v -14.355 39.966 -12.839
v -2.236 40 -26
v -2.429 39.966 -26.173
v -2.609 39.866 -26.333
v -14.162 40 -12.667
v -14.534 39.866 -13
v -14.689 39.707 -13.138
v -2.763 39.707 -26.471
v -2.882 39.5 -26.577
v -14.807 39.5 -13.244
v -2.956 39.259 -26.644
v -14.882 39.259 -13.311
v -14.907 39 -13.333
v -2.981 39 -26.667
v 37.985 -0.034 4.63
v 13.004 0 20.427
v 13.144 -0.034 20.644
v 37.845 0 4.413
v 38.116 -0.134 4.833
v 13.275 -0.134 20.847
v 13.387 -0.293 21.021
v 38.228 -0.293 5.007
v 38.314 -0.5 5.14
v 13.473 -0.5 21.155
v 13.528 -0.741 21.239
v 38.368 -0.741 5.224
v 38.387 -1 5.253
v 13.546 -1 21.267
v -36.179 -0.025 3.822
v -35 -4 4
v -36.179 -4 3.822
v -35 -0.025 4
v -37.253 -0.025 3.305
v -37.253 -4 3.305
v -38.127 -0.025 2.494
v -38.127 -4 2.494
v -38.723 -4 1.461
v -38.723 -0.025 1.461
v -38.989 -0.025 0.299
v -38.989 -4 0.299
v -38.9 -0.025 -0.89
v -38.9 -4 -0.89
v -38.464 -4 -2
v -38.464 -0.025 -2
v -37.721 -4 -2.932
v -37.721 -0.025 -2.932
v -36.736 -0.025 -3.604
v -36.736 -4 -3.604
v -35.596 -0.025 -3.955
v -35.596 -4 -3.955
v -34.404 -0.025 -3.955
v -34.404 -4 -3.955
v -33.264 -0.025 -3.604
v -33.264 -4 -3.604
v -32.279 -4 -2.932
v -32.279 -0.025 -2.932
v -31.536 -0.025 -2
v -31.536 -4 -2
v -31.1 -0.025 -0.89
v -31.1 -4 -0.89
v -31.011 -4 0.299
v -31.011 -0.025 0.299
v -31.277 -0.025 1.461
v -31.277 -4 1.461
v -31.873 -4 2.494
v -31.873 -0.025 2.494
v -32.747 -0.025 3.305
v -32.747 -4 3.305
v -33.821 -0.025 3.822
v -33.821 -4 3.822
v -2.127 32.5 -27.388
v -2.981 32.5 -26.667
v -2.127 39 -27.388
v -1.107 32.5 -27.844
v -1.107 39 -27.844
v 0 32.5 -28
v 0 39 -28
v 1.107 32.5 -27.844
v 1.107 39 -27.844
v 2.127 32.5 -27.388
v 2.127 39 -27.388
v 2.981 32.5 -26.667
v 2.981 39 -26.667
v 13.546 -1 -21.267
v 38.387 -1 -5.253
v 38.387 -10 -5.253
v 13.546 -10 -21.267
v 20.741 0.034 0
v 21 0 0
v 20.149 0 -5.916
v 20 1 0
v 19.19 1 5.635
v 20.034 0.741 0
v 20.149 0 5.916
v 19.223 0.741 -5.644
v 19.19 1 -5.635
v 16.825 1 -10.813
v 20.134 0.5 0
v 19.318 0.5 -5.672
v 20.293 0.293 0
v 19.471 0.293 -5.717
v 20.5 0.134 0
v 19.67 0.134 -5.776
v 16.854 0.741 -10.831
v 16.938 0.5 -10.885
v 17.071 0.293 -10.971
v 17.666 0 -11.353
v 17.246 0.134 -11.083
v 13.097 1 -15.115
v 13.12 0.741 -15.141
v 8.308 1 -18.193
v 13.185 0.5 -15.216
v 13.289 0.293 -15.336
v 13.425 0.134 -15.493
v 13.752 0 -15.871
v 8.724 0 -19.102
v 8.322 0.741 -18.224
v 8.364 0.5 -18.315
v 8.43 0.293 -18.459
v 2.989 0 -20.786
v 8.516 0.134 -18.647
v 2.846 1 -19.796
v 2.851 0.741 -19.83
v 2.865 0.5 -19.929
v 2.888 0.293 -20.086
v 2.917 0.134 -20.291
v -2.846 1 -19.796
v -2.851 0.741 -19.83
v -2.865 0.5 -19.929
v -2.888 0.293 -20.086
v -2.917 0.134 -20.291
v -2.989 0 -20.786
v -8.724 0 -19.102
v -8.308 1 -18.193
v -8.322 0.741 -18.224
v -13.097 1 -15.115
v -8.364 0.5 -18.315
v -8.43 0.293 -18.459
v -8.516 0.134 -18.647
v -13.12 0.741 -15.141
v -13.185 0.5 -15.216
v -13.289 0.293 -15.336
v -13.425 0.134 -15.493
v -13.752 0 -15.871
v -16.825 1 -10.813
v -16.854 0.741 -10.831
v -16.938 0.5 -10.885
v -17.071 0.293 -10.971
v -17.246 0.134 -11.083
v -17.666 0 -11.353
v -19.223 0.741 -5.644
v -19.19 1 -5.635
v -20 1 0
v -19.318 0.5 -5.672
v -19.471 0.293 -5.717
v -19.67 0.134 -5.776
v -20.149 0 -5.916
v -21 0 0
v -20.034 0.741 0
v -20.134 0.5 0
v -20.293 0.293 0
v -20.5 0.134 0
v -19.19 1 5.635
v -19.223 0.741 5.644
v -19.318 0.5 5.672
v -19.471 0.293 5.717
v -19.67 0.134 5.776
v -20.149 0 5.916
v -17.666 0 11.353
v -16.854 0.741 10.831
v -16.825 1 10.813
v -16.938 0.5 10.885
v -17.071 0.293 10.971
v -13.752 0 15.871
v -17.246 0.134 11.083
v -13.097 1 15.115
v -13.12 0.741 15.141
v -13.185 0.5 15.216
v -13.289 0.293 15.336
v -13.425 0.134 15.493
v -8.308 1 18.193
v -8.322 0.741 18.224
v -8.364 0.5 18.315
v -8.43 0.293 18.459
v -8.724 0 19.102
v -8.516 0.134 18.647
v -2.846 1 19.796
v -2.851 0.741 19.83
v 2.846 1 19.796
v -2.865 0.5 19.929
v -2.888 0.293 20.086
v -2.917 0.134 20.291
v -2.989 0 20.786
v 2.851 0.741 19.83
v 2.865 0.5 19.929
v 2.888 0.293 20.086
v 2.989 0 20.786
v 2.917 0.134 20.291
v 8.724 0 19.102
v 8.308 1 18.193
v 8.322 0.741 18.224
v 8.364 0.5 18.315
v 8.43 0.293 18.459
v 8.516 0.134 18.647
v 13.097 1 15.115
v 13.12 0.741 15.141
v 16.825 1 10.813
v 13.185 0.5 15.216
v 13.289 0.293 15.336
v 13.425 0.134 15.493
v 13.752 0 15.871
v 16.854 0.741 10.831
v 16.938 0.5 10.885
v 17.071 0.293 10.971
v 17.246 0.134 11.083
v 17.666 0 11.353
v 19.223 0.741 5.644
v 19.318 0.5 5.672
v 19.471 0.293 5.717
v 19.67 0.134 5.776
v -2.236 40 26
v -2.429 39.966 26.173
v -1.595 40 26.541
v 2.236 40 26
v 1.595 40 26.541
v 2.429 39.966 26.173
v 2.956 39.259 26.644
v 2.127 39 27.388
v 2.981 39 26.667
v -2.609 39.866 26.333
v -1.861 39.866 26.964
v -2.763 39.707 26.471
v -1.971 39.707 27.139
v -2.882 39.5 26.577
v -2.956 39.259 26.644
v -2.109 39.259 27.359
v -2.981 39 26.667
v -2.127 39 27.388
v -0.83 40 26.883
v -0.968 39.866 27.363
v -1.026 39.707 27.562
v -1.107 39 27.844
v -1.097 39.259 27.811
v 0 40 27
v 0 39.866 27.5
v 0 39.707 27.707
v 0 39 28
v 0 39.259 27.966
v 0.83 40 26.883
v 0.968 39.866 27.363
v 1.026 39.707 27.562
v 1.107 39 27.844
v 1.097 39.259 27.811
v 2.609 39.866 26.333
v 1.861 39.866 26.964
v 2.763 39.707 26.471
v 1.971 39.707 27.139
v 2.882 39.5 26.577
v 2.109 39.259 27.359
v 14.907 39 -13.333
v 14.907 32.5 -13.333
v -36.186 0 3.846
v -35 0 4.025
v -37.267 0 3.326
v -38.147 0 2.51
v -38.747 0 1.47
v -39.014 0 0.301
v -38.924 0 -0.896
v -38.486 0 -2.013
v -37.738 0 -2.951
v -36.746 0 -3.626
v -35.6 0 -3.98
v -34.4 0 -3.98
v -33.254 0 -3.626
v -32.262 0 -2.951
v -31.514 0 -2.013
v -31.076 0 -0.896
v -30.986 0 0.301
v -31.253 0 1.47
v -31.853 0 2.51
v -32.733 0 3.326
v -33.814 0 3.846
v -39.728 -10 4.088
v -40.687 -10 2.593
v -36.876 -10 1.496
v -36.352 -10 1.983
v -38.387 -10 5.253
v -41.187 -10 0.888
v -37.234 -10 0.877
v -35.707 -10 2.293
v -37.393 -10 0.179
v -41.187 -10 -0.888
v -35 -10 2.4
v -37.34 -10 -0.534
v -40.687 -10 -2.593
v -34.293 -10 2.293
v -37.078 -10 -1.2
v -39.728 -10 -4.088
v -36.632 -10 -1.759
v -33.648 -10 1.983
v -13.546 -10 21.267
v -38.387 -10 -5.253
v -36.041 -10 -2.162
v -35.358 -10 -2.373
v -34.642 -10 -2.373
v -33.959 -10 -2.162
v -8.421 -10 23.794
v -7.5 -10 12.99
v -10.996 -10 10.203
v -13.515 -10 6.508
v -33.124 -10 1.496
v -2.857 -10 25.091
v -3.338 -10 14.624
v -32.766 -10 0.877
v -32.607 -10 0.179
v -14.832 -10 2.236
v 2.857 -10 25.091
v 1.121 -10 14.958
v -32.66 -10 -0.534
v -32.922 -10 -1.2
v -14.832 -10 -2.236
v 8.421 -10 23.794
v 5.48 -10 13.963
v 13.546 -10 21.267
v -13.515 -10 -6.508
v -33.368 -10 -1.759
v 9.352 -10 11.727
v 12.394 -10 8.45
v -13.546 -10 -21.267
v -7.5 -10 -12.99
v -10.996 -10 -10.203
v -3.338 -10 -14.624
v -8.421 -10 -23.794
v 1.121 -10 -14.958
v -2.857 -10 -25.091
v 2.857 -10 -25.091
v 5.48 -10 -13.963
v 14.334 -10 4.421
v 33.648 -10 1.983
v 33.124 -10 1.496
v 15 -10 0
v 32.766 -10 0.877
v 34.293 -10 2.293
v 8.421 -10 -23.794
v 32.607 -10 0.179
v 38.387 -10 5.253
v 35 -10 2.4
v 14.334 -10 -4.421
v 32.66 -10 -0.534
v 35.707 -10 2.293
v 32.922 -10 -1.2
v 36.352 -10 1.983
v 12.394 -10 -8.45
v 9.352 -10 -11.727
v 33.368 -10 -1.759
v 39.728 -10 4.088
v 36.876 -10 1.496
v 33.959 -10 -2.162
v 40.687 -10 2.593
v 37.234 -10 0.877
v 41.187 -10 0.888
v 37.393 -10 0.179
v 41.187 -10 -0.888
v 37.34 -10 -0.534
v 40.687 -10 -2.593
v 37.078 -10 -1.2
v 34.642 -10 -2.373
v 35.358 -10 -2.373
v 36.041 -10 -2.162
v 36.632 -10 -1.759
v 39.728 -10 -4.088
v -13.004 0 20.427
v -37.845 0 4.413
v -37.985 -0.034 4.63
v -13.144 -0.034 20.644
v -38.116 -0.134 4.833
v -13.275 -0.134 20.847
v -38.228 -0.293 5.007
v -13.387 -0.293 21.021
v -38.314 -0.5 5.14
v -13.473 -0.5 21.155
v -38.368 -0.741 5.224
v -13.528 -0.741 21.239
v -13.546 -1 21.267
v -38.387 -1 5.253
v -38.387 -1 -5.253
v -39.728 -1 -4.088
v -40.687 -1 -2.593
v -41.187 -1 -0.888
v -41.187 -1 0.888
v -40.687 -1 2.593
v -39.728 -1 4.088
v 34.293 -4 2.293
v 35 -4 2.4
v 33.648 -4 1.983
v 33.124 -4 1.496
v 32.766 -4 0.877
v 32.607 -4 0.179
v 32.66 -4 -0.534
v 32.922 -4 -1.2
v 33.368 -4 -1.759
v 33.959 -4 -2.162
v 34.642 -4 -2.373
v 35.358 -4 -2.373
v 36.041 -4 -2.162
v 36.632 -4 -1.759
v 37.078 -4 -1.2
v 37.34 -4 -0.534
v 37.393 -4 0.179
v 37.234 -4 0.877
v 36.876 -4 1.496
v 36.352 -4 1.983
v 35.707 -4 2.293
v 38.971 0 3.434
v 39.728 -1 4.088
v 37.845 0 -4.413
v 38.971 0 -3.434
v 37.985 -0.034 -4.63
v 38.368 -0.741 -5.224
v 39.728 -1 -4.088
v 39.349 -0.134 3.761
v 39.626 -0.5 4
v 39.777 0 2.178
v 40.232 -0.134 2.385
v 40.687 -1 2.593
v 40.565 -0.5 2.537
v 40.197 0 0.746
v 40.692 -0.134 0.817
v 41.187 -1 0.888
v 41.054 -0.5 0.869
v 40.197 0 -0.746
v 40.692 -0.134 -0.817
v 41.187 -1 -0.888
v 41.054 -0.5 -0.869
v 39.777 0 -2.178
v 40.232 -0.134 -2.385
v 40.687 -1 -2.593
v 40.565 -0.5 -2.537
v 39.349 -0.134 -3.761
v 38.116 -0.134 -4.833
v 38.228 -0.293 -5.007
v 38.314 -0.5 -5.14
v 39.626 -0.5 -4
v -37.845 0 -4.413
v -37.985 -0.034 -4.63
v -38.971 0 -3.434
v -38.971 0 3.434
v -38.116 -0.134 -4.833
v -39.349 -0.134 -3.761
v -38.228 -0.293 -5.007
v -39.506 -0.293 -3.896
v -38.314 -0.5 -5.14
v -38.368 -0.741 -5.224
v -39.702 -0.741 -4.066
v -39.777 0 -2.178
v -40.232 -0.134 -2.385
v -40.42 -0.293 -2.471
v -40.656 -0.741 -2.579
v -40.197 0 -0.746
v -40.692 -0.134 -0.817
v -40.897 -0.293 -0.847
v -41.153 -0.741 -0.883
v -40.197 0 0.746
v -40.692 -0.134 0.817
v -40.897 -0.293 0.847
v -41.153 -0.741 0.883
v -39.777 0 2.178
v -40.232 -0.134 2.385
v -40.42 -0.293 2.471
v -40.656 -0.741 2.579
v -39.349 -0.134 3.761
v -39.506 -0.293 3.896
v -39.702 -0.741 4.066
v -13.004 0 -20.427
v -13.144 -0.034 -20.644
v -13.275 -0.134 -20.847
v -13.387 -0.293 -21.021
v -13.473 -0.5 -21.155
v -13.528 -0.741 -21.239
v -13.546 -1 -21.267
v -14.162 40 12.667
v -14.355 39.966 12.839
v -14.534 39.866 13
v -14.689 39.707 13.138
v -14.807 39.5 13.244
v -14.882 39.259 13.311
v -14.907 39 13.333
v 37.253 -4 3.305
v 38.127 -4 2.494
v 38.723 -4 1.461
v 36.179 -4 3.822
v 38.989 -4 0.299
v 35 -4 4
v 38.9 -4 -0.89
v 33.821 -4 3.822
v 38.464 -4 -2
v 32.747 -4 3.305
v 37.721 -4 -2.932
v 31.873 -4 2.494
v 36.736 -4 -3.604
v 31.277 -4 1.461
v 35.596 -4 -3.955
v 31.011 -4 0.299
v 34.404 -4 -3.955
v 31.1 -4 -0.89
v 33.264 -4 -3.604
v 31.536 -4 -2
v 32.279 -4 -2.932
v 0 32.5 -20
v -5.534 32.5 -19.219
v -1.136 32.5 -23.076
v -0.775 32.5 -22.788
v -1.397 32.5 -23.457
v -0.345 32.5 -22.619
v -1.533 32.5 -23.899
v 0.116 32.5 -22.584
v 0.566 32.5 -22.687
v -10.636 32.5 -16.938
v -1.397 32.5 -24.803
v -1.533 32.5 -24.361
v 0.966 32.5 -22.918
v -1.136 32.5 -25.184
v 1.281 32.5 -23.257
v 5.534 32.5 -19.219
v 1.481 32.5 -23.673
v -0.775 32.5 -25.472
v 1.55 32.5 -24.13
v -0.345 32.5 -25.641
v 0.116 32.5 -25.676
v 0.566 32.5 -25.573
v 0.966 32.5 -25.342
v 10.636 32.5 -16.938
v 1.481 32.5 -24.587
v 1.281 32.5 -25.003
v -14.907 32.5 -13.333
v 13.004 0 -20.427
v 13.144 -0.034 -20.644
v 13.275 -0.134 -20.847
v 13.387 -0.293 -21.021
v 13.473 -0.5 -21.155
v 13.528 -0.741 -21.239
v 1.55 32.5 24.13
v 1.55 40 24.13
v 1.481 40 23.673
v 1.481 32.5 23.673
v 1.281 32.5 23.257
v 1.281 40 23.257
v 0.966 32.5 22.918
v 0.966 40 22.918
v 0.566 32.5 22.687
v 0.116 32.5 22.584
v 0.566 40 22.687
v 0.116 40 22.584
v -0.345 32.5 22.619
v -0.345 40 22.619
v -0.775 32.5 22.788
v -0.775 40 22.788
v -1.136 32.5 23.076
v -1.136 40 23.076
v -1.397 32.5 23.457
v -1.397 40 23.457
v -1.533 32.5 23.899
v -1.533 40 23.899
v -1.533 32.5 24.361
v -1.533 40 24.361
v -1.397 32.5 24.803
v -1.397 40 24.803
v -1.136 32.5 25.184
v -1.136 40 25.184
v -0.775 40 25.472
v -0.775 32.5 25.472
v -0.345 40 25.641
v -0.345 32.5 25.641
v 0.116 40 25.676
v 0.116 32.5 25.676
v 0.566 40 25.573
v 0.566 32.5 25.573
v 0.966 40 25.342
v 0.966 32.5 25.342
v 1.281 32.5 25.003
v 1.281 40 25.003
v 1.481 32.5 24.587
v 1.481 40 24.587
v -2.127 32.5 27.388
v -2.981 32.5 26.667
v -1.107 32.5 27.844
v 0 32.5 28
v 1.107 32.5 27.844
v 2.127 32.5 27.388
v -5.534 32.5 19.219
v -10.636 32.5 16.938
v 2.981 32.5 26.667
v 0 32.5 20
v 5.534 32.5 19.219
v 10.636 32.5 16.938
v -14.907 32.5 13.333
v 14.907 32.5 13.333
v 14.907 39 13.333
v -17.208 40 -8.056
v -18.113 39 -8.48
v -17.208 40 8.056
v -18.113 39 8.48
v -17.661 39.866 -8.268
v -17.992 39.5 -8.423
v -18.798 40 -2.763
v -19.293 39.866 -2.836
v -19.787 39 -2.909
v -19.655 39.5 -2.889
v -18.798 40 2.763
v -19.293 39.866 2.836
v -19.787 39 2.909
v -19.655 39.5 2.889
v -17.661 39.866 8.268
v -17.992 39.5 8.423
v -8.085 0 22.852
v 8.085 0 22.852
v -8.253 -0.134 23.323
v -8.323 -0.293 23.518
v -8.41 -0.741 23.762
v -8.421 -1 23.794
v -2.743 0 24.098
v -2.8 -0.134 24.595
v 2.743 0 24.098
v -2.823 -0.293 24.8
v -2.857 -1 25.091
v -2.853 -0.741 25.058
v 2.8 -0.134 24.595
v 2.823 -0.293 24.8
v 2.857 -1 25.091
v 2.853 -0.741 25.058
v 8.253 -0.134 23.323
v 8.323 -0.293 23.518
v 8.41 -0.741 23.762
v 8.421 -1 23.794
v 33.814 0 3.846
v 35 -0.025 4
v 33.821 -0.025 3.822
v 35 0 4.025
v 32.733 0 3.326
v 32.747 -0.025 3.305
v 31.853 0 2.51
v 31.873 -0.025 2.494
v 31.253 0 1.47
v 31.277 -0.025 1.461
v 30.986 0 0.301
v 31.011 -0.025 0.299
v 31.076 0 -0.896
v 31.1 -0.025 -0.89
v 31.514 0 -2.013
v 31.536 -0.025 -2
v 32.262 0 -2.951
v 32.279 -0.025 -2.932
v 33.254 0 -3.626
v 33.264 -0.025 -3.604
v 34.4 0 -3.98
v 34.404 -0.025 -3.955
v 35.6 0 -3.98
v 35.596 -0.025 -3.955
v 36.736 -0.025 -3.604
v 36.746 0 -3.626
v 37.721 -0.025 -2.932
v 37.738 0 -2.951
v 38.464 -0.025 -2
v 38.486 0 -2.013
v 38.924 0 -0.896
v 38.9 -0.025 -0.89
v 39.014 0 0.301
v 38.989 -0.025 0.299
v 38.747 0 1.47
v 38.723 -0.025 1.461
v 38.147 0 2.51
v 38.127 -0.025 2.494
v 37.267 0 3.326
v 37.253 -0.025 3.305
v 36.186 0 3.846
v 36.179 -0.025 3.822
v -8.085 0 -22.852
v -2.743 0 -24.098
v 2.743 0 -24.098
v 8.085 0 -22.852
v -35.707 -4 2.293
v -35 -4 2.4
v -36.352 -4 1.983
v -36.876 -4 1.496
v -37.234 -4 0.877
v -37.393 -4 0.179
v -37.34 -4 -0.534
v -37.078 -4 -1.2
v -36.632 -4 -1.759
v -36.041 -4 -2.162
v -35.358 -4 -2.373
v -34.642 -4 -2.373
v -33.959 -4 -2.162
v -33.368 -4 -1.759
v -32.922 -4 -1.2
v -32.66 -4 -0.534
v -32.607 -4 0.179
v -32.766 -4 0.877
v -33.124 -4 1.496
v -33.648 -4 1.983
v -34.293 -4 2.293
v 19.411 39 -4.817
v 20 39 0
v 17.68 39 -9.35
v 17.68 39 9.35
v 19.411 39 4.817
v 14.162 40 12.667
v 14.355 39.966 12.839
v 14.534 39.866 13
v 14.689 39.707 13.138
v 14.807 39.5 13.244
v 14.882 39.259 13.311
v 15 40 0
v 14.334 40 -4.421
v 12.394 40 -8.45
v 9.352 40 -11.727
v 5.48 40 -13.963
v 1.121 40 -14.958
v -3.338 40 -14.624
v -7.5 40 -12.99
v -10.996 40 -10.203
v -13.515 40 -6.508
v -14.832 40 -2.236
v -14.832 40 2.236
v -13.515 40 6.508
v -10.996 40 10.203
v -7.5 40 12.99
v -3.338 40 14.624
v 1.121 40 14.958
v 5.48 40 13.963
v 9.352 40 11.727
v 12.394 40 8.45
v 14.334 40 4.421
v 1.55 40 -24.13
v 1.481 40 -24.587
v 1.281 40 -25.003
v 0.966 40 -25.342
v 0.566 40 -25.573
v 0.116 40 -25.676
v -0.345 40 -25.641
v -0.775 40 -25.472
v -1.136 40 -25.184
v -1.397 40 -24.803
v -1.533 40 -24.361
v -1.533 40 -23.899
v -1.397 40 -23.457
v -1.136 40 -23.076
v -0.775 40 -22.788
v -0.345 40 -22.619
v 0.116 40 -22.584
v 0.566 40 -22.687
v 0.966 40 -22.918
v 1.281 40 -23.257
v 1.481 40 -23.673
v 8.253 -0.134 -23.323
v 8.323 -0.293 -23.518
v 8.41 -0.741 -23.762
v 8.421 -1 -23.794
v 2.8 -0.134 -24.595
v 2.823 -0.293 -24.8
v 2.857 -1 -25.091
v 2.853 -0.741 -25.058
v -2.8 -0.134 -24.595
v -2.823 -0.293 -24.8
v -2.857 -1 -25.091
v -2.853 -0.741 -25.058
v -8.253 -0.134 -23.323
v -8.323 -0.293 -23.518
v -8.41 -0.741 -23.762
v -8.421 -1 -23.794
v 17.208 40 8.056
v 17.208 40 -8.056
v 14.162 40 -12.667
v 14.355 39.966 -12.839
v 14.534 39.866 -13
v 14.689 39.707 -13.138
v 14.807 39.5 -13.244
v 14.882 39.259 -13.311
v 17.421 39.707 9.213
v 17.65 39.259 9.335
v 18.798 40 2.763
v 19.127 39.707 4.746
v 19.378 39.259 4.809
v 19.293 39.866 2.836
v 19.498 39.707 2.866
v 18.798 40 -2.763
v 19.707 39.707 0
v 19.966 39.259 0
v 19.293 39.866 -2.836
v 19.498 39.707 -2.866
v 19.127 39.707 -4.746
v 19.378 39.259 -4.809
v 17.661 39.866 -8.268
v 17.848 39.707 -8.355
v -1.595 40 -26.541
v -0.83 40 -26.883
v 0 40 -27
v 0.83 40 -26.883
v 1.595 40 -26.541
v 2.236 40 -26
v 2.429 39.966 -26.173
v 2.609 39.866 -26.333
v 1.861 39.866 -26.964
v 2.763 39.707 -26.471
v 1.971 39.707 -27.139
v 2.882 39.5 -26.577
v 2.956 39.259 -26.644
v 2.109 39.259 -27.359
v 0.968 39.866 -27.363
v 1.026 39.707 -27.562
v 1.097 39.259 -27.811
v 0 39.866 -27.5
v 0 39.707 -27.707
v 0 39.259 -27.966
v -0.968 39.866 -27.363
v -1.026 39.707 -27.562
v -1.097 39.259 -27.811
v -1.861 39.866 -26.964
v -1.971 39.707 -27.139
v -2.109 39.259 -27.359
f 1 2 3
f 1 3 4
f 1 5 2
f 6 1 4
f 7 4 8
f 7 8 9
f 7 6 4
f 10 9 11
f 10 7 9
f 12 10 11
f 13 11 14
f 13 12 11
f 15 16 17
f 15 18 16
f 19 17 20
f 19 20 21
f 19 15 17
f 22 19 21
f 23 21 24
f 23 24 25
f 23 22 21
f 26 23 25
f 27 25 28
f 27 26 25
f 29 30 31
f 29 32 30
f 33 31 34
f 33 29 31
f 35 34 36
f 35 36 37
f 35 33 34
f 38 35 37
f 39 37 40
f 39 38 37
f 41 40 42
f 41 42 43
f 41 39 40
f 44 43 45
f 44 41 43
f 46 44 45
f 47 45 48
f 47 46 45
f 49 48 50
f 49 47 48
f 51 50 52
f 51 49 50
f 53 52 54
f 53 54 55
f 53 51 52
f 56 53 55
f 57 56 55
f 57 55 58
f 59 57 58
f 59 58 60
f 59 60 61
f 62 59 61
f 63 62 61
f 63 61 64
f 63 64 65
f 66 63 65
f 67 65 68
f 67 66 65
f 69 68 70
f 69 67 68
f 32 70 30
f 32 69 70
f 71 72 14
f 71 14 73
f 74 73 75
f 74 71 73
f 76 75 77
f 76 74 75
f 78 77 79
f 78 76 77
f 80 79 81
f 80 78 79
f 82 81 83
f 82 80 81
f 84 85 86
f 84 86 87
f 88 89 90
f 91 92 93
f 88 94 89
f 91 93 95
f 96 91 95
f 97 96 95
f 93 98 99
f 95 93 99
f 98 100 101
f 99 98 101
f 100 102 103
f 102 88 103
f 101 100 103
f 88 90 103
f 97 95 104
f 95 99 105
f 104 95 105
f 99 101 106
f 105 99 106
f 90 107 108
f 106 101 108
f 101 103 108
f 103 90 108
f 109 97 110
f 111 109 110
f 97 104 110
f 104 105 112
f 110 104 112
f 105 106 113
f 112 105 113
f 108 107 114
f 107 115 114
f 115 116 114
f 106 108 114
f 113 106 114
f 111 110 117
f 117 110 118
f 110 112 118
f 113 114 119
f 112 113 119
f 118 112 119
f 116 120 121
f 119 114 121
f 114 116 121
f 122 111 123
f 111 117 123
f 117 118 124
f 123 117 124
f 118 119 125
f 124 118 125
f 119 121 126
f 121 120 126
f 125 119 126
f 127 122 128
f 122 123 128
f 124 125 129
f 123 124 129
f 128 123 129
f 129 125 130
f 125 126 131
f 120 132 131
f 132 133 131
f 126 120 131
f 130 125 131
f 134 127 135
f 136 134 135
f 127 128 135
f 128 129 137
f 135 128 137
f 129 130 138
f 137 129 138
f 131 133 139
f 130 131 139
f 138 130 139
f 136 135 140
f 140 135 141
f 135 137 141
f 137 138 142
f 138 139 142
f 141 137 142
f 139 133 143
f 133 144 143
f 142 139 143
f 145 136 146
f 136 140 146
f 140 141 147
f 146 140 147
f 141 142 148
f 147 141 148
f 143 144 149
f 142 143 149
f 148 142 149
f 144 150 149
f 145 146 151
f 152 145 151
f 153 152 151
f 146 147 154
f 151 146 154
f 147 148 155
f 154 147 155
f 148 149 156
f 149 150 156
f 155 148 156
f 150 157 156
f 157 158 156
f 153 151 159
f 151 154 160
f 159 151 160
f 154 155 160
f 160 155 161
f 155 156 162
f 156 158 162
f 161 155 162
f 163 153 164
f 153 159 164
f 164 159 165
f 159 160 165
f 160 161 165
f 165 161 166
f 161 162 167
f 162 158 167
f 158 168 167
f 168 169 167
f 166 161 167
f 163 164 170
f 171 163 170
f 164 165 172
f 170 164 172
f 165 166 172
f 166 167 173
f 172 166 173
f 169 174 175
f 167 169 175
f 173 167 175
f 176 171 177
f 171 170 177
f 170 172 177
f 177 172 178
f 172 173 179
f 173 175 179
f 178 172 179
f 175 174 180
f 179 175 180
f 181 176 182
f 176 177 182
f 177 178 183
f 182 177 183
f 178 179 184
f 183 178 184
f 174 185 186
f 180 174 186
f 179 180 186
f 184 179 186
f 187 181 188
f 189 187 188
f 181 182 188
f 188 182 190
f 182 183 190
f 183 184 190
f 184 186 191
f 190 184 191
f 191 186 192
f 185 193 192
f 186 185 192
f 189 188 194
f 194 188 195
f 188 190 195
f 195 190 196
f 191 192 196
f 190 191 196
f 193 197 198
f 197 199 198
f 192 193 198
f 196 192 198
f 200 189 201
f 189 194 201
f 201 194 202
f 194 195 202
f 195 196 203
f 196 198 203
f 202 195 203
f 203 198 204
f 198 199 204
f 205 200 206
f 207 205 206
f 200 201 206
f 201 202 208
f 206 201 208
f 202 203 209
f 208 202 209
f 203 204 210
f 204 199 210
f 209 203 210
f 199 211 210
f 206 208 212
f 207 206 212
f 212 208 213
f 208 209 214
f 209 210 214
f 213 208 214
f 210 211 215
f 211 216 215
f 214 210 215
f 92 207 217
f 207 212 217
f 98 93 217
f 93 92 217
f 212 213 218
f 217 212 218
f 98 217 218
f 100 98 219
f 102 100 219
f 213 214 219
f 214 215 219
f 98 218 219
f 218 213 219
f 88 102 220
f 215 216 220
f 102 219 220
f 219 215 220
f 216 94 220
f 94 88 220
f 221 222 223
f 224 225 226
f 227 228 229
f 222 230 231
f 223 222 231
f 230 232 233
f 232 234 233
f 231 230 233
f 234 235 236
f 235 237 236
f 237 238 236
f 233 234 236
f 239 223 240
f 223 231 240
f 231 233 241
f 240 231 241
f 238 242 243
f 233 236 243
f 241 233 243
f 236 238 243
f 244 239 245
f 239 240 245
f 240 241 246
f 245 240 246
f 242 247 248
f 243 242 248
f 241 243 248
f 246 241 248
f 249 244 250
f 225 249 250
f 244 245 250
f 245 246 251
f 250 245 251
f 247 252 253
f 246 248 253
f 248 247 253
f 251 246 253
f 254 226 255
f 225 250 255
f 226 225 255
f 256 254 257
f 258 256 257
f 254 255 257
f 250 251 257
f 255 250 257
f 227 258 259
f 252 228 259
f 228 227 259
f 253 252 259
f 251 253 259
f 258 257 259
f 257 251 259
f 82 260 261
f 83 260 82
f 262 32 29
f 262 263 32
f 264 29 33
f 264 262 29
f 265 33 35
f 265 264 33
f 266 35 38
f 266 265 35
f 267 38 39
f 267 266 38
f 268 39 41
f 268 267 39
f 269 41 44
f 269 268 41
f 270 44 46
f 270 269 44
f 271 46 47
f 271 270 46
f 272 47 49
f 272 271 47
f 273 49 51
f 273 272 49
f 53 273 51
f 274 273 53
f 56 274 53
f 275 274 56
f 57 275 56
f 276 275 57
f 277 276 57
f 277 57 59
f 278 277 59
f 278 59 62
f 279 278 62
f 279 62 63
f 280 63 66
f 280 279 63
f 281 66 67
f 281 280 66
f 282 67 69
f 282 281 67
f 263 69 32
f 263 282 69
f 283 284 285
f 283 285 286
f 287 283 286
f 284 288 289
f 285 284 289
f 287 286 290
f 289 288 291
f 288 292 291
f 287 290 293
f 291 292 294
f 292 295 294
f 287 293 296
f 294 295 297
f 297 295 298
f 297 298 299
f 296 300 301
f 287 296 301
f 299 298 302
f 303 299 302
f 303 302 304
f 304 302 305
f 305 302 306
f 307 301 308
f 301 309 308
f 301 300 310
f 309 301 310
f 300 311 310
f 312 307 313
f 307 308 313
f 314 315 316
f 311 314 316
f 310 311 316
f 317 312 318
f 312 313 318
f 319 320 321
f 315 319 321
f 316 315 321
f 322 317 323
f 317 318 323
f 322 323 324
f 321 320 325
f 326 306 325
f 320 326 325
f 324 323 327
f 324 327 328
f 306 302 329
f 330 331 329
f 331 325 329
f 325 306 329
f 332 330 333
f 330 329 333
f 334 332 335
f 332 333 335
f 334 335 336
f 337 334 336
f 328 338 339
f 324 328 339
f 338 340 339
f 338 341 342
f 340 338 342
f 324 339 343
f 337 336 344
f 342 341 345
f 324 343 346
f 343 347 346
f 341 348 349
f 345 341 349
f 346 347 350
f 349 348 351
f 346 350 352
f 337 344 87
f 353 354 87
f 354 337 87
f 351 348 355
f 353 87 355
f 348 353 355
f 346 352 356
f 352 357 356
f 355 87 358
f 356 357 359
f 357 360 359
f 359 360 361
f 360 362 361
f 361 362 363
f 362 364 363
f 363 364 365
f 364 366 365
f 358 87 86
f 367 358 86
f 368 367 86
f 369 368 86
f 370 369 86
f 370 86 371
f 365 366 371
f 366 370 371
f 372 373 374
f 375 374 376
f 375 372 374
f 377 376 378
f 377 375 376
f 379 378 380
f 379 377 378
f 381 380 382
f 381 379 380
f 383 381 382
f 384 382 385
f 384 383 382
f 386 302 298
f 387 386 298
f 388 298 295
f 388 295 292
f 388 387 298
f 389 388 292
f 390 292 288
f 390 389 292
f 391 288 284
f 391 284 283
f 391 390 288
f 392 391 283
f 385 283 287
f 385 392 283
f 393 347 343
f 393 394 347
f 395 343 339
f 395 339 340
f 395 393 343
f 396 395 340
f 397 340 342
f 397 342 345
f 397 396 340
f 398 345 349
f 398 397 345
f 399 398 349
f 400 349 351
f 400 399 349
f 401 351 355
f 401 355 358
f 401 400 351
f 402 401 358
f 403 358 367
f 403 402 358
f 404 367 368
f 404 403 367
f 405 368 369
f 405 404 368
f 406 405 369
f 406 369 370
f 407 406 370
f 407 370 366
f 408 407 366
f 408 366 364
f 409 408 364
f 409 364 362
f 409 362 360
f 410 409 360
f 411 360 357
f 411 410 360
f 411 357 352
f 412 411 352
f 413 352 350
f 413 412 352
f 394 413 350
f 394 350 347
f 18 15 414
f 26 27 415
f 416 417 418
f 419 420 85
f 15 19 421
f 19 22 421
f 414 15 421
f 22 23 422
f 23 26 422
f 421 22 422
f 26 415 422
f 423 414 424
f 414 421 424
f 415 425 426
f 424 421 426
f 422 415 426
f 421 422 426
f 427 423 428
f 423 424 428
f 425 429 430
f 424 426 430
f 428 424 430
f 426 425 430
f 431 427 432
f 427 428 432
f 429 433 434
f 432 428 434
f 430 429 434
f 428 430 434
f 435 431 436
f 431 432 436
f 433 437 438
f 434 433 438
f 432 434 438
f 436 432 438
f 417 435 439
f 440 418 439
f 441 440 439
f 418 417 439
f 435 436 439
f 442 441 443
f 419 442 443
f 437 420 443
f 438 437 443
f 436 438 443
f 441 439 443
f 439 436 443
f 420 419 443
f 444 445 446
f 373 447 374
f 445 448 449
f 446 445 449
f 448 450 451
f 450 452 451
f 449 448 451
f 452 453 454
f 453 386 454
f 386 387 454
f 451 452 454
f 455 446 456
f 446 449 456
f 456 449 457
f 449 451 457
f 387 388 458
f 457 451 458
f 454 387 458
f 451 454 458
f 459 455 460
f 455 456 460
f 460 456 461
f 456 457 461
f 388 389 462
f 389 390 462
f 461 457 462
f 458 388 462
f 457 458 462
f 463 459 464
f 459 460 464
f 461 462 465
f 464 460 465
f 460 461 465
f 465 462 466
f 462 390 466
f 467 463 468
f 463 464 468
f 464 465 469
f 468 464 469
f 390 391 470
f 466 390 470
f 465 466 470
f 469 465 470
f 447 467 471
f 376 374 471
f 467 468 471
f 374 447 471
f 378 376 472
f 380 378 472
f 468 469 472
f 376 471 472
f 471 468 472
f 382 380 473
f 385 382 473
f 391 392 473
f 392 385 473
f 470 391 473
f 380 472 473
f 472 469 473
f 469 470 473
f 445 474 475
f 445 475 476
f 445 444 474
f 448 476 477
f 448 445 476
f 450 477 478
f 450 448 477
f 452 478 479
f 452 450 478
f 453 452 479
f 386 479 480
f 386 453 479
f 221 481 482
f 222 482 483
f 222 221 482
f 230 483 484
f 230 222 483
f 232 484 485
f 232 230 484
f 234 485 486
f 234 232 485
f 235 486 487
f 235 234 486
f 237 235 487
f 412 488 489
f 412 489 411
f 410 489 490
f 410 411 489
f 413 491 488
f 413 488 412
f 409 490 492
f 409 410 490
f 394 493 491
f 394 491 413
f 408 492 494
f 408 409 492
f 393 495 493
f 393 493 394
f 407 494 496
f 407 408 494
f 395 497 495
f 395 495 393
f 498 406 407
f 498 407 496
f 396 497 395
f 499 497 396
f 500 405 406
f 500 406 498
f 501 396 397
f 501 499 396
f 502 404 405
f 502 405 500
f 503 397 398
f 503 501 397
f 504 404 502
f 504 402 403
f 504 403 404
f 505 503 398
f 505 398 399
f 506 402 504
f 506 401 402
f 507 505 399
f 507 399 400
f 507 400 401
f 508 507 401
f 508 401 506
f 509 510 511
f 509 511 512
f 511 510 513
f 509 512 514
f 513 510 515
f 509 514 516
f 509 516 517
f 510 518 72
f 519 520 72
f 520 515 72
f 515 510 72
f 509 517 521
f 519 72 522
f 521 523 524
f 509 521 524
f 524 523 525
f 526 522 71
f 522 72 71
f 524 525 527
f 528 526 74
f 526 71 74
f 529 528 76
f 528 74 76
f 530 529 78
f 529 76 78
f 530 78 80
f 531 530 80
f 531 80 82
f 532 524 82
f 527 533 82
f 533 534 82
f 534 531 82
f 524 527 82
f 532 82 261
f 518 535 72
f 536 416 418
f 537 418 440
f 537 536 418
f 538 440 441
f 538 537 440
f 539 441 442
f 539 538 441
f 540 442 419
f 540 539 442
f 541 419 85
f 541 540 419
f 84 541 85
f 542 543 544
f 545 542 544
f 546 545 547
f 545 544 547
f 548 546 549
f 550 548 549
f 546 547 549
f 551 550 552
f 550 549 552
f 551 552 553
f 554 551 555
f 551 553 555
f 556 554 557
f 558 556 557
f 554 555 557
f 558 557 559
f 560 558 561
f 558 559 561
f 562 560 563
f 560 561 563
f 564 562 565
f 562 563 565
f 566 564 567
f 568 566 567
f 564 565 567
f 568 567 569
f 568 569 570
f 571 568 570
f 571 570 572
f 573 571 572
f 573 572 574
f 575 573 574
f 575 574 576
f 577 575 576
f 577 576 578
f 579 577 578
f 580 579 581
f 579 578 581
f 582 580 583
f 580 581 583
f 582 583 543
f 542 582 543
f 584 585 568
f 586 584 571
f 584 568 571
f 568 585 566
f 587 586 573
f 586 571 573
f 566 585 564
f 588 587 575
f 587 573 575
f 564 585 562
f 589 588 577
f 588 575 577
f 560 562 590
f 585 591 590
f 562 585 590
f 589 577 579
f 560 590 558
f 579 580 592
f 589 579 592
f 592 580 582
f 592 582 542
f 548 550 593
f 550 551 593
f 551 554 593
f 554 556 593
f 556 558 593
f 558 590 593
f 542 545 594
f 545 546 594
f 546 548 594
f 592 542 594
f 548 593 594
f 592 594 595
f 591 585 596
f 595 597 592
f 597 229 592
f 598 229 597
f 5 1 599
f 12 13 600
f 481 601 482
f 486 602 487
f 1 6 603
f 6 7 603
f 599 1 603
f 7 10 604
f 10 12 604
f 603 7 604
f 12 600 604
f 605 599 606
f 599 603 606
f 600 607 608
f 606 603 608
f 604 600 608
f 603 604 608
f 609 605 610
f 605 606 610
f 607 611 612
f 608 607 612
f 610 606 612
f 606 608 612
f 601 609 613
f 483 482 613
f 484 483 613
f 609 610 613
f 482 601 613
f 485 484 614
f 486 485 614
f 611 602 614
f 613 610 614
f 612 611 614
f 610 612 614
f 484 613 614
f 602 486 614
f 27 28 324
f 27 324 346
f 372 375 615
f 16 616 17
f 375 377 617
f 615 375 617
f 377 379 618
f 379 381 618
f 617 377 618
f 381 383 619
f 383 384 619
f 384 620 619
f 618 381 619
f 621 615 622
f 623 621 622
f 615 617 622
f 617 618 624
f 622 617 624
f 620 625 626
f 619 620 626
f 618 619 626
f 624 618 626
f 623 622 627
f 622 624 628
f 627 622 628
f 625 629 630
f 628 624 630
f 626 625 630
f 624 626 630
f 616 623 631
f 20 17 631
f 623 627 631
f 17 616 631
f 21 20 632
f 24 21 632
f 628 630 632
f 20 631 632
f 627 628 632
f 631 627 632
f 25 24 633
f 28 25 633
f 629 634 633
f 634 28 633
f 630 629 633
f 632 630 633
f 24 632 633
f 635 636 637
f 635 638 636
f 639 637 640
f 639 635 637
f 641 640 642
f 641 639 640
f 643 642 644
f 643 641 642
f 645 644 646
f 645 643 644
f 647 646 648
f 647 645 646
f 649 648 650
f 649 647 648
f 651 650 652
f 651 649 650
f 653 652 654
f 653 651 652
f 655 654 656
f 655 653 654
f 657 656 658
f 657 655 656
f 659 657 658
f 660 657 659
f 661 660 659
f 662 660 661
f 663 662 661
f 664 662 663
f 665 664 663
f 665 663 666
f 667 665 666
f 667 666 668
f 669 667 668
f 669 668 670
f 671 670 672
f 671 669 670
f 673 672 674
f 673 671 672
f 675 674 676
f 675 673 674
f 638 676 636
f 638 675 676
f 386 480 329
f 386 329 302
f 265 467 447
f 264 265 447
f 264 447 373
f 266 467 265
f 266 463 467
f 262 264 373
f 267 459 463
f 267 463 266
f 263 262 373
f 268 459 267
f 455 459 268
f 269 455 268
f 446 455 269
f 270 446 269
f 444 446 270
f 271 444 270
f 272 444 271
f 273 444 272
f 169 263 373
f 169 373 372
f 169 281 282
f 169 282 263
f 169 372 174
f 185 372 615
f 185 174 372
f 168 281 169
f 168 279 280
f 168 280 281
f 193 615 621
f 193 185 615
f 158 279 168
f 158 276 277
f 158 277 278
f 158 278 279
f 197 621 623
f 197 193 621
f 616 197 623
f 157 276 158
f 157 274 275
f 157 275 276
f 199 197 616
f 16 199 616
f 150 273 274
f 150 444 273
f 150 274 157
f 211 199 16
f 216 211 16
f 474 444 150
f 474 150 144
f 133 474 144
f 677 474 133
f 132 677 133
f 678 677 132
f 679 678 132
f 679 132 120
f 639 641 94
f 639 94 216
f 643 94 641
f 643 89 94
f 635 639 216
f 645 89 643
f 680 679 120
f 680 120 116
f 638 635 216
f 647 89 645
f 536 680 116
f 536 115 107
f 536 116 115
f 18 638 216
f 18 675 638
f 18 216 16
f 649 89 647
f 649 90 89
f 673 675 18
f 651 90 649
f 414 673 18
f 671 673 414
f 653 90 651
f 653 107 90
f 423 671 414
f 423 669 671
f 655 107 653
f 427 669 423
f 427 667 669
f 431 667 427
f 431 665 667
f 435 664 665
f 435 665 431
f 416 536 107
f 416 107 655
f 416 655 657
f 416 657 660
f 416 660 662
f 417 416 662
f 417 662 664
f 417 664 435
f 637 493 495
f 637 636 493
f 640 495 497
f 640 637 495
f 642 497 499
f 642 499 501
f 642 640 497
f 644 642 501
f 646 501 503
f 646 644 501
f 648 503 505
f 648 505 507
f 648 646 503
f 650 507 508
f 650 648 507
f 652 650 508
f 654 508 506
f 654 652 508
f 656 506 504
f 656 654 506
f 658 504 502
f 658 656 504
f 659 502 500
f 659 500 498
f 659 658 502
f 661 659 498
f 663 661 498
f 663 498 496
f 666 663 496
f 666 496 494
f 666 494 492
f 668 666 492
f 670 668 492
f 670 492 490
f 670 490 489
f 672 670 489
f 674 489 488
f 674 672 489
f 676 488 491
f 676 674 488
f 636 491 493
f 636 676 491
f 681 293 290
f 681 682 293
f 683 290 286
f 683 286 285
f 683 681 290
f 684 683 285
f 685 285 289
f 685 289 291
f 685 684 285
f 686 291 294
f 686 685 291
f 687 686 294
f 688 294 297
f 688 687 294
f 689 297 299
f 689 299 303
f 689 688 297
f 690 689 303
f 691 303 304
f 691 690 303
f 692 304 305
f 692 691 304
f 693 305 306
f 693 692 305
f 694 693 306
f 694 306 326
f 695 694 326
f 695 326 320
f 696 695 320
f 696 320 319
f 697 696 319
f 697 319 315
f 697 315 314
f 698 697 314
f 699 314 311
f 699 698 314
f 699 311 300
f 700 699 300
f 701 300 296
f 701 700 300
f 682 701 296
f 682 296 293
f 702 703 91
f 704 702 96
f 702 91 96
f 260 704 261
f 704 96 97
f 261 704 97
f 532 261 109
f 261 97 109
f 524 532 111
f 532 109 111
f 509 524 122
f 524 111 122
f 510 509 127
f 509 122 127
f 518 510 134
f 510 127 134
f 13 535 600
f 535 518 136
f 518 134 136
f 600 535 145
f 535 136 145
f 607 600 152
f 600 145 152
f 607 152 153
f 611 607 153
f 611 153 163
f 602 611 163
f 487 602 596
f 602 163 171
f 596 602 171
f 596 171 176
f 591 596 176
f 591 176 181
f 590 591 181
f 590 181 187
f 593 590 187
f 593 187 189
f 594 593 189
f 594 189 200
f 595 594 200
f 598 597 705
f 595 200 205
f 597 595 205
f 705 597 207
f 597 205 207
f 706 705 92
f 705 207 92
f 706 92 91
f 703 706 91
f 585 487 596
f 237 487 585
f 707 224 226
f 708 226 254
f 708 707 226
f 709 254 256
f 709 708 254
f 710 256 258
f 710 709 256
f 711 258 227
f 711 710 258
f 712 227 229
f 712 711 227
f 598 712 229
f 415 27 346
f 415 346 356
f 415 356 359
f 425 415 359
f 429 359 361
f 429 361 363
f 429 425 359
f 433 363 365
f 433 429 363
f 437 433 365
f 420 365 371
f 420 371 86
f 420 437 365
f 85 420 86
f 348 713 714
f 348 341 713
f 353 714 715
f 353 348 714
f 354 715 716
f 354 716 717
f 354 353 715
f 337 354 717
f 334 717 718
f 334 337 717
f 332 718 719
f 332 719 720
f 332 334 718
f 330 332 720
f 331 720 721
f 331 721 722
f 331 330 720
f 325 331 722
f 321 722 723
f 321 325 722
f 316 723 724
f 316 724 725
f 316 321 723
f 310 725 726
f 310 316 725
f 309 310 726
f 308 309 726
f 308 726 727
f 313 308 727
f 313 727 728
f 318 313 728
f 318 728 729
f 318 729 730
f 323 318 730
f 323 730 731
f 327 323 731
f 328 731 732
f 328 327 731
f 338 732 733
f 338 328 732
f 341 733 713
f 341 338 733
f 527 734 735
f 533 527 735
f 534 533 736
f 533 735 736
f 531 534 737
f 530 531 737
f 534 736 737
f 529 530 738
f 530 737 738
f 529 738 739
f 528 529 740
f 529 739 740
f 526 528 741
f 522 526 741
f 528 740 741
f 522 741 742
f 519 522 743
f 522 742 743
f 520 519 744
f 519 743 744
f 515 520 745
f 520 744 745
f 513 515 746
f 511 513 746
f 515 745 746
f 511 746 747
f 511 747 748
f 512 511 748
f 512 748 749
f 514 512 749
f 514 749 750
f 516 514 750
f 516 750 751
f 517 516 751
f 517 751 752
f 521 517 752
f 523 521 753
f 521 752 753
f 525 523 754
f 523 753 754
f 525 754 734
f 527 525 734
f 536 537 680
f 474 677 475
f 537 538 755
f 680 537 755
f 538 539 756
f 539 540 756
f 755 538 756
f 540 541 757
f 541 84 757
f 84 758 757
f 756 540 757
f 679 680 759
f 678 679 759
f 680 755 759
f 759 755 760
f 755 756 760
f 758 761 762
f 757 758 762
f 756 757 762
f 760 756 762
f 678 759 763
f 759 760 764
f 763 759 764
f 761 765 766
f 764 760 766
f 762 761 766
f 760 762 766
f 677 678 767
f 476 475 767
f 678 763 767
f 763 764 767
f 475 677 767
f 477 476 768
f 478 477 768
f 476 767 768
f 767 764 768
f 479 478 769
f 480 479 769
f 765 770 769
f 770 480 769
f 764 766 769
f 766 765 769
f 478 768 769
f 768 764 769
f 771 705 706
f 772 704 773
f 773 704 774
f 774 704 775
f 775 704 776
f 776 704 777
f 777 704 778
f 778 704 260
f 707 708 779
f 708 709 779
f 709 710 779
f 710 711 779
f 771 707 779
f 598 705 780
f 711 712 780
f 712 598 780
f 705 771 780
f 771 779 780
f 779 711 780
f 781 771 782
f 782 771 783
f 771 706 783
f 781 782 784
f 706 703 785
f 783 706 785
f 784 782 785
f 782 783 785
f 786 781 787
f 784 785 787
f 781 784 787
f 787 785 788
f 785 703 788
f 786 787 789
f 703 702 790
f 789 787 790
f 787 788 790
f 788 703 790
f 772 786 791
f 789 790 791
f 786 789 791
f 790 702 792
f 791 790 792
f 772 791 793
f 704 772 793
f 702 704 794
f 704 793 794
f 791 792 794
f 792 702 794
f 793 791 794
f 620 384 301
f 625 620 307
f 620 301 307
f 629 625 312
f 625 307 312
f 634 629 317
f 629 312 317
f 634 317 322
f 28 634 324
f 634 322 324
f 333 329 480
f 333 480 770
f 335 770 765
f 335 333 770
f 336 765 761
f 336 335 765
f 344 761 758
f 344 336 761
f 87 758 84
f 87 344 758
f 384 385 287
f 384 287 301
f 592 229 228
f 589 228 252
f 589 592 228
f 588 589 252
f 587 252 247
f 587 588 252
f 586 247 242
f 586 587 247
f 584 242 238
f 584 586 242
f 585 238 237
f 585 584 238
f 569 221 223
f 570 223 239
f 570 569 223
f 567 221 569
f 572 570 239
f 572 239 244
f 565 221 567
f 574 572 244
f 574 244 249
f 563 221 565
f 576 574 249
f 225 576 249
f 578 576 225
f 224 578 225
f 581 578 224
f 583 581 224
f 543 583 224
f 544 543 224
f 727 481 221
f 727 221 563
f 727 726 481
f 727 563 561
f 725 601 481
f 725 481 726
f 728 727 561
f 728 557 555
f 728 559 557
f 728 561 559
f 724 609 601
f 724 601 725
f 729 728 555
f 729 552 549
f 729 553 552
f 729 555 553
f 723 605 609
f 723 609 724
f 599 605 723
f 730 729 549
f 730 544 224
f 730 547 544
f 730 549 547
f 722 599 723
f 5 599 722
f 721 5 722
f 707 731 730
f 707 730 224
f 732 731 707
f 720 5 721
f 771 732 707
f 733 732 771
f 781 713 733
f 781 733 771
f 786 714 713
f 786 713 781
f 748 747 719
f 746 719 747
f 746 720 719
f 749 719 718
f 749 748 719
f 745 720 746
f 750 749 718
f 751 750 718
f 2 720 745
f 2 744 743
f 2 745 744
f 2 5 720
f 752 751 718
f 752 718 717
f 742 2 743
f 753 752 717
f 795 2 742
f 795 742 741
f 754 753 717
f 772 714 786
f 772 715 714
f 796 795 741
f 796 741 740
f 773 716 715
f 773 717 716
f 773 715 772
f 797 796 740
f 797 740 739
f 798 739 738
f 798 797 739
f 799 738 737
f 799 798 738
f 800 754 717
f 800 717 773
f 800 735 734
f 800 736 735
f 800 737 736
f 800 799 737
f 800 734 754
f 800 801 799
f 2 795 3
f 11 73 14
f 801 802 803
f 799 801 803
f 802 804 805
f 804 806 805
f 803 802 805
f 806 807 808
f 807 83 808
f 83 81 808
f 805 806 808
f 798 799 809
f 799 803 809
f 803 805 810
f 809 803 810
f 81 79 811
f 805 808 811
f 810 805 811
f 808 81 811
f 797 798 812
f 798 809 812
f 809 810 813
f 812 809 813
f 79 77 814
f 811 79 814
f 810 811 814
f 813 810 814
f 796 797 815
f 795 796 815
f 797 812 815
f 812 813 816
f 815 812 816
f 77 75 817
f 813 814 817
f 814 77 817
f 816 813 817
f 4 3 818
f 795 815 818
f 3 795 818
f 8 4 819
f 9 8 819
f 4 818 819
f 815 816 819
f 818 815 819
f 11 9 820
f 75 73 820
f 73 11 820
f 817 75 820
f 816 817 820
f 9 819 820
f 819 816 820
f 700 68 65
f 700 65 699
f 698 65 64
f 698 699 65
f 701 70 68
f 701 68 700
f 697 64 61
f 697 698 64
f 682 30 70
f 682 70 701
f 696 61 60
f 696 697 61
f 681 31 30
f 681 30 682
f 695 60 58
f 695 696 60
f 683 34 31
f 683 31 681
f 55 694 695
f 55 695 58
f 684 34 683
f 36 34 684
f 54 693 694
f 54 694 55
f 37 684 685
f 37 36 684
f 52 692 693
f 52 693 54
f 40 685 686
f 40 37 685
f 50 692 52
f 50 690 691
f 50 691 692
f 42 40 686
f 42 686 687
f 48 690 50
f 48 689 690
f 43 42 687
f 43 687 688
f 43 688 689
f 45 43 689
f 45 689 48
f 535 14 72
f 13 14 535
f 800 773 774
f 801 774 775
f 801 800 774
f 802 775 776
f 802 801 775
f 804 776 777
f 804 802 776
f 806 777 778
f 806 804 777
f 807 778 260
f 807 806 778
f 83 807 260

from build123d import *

# Parameters (mm, degrees)
SKETCH1_R                     = 6.25
SKETCH1_R_2                   = 20
SKETCH1_R_3                   = 15
SKETCH1_R_4                   = 1.55
BOSS_EXTRUDE1_DEPTH           = 10
SKETCH1_3_R                   = 20
SKETCH1_3_R_2                 = 15
BOSS_EXTRUDE2_DEPTH           = 40
BOSS_EXTRUDE3_START           = 40
SKETCH1_4_R                   = 1.55
BOSS_EXTRUDE3_DEPTH           = 7.5
CBORE_FOR_M4_SHCS1_AT_2_COUNT = 2
CBORE_FOR_M4_SHCS1_AT_2_PITCH = 70
FILLET1_R                     = 25
FILLET3_R                     = 4
FILLET2_R                     = 1


with BuildPart() as part:
    # Sketch1 → Boss-Extrude1 (new body)
    with BuildSketch(Plane(origin=(0, 0, 0), x_dir=(1, 0, 0), z_dir=(0, 1, 0))):
        with Locations((-35, 0)):
            Circle(SKETCH1_R)
        with BuildLine():
            Line((0, 30), (-38.386505715, 5.253006667))
            ThreePointArc((-38.386505715, 5.253006667), (-32.008609079, 5.487629758), (-28.75, 0))
            ThreePointArc((-28.75, 0), (-32.008609079, -5.487629758), (-38.386505715, -5.253006667))
            Line((-38.386505715, -5.253006667), (0, -30))
            Line((0, -30), (-14.90711985, -13.333333333))
            ThreePointArc((-14.90711985, -13.333333333), (-20, 0), (-14.90711985, 13.333333333))
            Line((-14.90711985, 13.333333333), (0, 30))
        make_face()
        Circle(SKETCH1_R_2)
        Circle(SKETCH1_R_3, mode=Mode.SUBTRACT)
        with BuildLine():
            Line((14.90711985, 13.333333333), (0, 30))
            Line((0, 30), (-14.90711985, 13.333333333))
            ThreePointArc((-14.90711985, 13.333333333), (0, 20), (14.90711985, 13.333333333))
        make_face()
        with Locations((0, 24.13)):
            Circle(SKETCH1_R_4, mode=Mode.SUBTRACT)
        with Locations((0, 24.13)):
            Circle(SKETCH1_R_4)
        with BuildLine():
            Line((38.386505715, 5.253006667), (0, 30))
            Line((0, 30), (14.90711985, 13.333333333))
            ThreePointArc((14.90711985, 13.333333333), (18.683447179, 7.136441795), (20, 0))
            ThreePointArc((20, 0), (18.683447179, -7.136441795), (14.90711985, -13.333333333))
            Line((14.90711985, -13.333333333), (0, -30))
            Line((0, -30), (38.386505715, -5.253006667))
            ThreePointArc((38.386505715, -5.253006667), (28.75, 0), (38.386505715, 5.253006667))
        make_face()
        with BuildLine():
            Line((-14.90711985, -13.333333333), (0, -30))
            Line((0, -30), (14.90711985, -13.333333333))
            ThreePointArc((14.90711985, -13.333333333), (0, -20), (-14.90711985, -13.333333333))
        make_face()
        with Locations((0, -24.13)):
            Circle(SKETCH1_R_4, mode=Mode.SUBTRACT)
        with Locations((0, -24.13)):
            Circle(SKETCH1_R_4)
        with Locations((35, 0)):
            Circle(SKETCH1_R)
    extrude(amount=-BOSS_EXTRUDE1_DEPTH)

    # Sketch1<3> → Boss-Extrude2 (add)
    with BuildSketch(Plane(origin=(0, 0, 0), x_dir=(1, 0, 0), z_dir=(0, 1, 0))):
        Circle(SKETCH1_3_R)
        Circle(SKETCH1_3_R_2, mode=Mode.SUBTRACT)
    extrude(amount=BOSS_EXTRUDE2_DEPTH)

    # Sketch1<4> → Boss-Extrude3 (add)
    with BuildSketch(Plane(origin=(0, 0, 0), x_dir=(1, 0, 0), z_dir=(0, 1, 0)).offset(BOSS_EXTRUDE3_START)):
        with BuildLine():
            Line((14.90711985, 13.333333333), (0, 30))
            Line((0, 30), (-14.90711985, 13.333333333))
            ThreePointArc((-14.90711985, 13.333333333), (0, 20), (14.90711985, 13.333333333))
        make_face()
        with Locations((0, 24.13)):
            Circle(SKETCH1_4_R, mode=Mode.SUBTRACT)
        with BuildLine():
            Line((-14.90711985, -13.333333333), (0, -30))
            Line((0, -30), (14.90711985, -13.333333333))
            ThreePointArc((14.90711985, -13.333333333), (0, -20), (-14.90711985, -13.333333333))
        make_face()
        with Locations((0, -24.13)):
            Circle(SKETCH1_4_R, mode=Mode.SUBTRACT)
    extrude(amount=-BOSS_EXTRUDE3_DEPTH)

    # Sketch3 → CBORE for M4 SHCS1 (revolve, cut)
    with BuildSketch(Plane(origin=(-35, 0, 0), x_dir=(0, 0, 1), z_dir=(1, 0, 0))):
        Polygon((0, 0), (0, 11.442065486), (2.4, 10), (2.4, 4), (4, 4), (4, 0.025), (4.025, 0), align=None)
    cbore_for_m4_shcs1 = revolve(axis=Axis((-35, 6.35, 0), (0, -1, 0)), mode=Mode.SUBTRACT)

    # CBORE for M4 SHCS1 at 2: CBORE for M4 SHCS1 ×2
    with Locations(*[(i * CBORE_FOR_M4_SHCS1_AT_2_PITCH, 0, 0) for i in range(1, CBORE_FOR_M4_SHCS1_AT_2_COUNT)]):
        add(cbore_for_m4_shcs1, mode=Mode.SUBTRACT)

    # Fillet1
    fillet1_edges = [part.edges().sort_by_distance(p)[0] for p in [
        (0, -5, -30),
        (0, -5, 30),
    ]]
    fillet(fillet1_edges, radius=FILLET1_R)

    # Fillet3
    fillet3_edges = [part.edges().sort_by_distance(p)[0] for p in [
        (0, 36.25, -30),
        (0, 36.25, 30),
    ]]
    fillet(fillet3_edges, radius=FILLET3_R)

    # Fillet2
    fillet2_edges = [part.edges().sort_by_distance(p)[0] for p in [
        (41.25, 0, 0),
        (-25.966264287, 0, 13.260081708),
        (-20, 0, 0),
        (-20, 40, 0),
        (-8.94427191, 40, -20),
        (8.94427191, 40, -20),
        (18.683447179, 40, 7.136441795),
        (8.94427191, 40, 20),
        (-8.94427191, 40, 20),
        (25.966264287, 0, -13.260081708),
        (25.966264287, 0, 13.260081708),
        (0, 0, 25.25513008),
        (0, 0, -25.25513008),
        (-41.25, 0, 0),
        (0, 40, 28),
        (0, 40, -28),
        (-25.966264287, 0, -13.260081708),
    ]]
    fillet(fillet2_edges, radius=FILLET2_R)


solid = part.part
